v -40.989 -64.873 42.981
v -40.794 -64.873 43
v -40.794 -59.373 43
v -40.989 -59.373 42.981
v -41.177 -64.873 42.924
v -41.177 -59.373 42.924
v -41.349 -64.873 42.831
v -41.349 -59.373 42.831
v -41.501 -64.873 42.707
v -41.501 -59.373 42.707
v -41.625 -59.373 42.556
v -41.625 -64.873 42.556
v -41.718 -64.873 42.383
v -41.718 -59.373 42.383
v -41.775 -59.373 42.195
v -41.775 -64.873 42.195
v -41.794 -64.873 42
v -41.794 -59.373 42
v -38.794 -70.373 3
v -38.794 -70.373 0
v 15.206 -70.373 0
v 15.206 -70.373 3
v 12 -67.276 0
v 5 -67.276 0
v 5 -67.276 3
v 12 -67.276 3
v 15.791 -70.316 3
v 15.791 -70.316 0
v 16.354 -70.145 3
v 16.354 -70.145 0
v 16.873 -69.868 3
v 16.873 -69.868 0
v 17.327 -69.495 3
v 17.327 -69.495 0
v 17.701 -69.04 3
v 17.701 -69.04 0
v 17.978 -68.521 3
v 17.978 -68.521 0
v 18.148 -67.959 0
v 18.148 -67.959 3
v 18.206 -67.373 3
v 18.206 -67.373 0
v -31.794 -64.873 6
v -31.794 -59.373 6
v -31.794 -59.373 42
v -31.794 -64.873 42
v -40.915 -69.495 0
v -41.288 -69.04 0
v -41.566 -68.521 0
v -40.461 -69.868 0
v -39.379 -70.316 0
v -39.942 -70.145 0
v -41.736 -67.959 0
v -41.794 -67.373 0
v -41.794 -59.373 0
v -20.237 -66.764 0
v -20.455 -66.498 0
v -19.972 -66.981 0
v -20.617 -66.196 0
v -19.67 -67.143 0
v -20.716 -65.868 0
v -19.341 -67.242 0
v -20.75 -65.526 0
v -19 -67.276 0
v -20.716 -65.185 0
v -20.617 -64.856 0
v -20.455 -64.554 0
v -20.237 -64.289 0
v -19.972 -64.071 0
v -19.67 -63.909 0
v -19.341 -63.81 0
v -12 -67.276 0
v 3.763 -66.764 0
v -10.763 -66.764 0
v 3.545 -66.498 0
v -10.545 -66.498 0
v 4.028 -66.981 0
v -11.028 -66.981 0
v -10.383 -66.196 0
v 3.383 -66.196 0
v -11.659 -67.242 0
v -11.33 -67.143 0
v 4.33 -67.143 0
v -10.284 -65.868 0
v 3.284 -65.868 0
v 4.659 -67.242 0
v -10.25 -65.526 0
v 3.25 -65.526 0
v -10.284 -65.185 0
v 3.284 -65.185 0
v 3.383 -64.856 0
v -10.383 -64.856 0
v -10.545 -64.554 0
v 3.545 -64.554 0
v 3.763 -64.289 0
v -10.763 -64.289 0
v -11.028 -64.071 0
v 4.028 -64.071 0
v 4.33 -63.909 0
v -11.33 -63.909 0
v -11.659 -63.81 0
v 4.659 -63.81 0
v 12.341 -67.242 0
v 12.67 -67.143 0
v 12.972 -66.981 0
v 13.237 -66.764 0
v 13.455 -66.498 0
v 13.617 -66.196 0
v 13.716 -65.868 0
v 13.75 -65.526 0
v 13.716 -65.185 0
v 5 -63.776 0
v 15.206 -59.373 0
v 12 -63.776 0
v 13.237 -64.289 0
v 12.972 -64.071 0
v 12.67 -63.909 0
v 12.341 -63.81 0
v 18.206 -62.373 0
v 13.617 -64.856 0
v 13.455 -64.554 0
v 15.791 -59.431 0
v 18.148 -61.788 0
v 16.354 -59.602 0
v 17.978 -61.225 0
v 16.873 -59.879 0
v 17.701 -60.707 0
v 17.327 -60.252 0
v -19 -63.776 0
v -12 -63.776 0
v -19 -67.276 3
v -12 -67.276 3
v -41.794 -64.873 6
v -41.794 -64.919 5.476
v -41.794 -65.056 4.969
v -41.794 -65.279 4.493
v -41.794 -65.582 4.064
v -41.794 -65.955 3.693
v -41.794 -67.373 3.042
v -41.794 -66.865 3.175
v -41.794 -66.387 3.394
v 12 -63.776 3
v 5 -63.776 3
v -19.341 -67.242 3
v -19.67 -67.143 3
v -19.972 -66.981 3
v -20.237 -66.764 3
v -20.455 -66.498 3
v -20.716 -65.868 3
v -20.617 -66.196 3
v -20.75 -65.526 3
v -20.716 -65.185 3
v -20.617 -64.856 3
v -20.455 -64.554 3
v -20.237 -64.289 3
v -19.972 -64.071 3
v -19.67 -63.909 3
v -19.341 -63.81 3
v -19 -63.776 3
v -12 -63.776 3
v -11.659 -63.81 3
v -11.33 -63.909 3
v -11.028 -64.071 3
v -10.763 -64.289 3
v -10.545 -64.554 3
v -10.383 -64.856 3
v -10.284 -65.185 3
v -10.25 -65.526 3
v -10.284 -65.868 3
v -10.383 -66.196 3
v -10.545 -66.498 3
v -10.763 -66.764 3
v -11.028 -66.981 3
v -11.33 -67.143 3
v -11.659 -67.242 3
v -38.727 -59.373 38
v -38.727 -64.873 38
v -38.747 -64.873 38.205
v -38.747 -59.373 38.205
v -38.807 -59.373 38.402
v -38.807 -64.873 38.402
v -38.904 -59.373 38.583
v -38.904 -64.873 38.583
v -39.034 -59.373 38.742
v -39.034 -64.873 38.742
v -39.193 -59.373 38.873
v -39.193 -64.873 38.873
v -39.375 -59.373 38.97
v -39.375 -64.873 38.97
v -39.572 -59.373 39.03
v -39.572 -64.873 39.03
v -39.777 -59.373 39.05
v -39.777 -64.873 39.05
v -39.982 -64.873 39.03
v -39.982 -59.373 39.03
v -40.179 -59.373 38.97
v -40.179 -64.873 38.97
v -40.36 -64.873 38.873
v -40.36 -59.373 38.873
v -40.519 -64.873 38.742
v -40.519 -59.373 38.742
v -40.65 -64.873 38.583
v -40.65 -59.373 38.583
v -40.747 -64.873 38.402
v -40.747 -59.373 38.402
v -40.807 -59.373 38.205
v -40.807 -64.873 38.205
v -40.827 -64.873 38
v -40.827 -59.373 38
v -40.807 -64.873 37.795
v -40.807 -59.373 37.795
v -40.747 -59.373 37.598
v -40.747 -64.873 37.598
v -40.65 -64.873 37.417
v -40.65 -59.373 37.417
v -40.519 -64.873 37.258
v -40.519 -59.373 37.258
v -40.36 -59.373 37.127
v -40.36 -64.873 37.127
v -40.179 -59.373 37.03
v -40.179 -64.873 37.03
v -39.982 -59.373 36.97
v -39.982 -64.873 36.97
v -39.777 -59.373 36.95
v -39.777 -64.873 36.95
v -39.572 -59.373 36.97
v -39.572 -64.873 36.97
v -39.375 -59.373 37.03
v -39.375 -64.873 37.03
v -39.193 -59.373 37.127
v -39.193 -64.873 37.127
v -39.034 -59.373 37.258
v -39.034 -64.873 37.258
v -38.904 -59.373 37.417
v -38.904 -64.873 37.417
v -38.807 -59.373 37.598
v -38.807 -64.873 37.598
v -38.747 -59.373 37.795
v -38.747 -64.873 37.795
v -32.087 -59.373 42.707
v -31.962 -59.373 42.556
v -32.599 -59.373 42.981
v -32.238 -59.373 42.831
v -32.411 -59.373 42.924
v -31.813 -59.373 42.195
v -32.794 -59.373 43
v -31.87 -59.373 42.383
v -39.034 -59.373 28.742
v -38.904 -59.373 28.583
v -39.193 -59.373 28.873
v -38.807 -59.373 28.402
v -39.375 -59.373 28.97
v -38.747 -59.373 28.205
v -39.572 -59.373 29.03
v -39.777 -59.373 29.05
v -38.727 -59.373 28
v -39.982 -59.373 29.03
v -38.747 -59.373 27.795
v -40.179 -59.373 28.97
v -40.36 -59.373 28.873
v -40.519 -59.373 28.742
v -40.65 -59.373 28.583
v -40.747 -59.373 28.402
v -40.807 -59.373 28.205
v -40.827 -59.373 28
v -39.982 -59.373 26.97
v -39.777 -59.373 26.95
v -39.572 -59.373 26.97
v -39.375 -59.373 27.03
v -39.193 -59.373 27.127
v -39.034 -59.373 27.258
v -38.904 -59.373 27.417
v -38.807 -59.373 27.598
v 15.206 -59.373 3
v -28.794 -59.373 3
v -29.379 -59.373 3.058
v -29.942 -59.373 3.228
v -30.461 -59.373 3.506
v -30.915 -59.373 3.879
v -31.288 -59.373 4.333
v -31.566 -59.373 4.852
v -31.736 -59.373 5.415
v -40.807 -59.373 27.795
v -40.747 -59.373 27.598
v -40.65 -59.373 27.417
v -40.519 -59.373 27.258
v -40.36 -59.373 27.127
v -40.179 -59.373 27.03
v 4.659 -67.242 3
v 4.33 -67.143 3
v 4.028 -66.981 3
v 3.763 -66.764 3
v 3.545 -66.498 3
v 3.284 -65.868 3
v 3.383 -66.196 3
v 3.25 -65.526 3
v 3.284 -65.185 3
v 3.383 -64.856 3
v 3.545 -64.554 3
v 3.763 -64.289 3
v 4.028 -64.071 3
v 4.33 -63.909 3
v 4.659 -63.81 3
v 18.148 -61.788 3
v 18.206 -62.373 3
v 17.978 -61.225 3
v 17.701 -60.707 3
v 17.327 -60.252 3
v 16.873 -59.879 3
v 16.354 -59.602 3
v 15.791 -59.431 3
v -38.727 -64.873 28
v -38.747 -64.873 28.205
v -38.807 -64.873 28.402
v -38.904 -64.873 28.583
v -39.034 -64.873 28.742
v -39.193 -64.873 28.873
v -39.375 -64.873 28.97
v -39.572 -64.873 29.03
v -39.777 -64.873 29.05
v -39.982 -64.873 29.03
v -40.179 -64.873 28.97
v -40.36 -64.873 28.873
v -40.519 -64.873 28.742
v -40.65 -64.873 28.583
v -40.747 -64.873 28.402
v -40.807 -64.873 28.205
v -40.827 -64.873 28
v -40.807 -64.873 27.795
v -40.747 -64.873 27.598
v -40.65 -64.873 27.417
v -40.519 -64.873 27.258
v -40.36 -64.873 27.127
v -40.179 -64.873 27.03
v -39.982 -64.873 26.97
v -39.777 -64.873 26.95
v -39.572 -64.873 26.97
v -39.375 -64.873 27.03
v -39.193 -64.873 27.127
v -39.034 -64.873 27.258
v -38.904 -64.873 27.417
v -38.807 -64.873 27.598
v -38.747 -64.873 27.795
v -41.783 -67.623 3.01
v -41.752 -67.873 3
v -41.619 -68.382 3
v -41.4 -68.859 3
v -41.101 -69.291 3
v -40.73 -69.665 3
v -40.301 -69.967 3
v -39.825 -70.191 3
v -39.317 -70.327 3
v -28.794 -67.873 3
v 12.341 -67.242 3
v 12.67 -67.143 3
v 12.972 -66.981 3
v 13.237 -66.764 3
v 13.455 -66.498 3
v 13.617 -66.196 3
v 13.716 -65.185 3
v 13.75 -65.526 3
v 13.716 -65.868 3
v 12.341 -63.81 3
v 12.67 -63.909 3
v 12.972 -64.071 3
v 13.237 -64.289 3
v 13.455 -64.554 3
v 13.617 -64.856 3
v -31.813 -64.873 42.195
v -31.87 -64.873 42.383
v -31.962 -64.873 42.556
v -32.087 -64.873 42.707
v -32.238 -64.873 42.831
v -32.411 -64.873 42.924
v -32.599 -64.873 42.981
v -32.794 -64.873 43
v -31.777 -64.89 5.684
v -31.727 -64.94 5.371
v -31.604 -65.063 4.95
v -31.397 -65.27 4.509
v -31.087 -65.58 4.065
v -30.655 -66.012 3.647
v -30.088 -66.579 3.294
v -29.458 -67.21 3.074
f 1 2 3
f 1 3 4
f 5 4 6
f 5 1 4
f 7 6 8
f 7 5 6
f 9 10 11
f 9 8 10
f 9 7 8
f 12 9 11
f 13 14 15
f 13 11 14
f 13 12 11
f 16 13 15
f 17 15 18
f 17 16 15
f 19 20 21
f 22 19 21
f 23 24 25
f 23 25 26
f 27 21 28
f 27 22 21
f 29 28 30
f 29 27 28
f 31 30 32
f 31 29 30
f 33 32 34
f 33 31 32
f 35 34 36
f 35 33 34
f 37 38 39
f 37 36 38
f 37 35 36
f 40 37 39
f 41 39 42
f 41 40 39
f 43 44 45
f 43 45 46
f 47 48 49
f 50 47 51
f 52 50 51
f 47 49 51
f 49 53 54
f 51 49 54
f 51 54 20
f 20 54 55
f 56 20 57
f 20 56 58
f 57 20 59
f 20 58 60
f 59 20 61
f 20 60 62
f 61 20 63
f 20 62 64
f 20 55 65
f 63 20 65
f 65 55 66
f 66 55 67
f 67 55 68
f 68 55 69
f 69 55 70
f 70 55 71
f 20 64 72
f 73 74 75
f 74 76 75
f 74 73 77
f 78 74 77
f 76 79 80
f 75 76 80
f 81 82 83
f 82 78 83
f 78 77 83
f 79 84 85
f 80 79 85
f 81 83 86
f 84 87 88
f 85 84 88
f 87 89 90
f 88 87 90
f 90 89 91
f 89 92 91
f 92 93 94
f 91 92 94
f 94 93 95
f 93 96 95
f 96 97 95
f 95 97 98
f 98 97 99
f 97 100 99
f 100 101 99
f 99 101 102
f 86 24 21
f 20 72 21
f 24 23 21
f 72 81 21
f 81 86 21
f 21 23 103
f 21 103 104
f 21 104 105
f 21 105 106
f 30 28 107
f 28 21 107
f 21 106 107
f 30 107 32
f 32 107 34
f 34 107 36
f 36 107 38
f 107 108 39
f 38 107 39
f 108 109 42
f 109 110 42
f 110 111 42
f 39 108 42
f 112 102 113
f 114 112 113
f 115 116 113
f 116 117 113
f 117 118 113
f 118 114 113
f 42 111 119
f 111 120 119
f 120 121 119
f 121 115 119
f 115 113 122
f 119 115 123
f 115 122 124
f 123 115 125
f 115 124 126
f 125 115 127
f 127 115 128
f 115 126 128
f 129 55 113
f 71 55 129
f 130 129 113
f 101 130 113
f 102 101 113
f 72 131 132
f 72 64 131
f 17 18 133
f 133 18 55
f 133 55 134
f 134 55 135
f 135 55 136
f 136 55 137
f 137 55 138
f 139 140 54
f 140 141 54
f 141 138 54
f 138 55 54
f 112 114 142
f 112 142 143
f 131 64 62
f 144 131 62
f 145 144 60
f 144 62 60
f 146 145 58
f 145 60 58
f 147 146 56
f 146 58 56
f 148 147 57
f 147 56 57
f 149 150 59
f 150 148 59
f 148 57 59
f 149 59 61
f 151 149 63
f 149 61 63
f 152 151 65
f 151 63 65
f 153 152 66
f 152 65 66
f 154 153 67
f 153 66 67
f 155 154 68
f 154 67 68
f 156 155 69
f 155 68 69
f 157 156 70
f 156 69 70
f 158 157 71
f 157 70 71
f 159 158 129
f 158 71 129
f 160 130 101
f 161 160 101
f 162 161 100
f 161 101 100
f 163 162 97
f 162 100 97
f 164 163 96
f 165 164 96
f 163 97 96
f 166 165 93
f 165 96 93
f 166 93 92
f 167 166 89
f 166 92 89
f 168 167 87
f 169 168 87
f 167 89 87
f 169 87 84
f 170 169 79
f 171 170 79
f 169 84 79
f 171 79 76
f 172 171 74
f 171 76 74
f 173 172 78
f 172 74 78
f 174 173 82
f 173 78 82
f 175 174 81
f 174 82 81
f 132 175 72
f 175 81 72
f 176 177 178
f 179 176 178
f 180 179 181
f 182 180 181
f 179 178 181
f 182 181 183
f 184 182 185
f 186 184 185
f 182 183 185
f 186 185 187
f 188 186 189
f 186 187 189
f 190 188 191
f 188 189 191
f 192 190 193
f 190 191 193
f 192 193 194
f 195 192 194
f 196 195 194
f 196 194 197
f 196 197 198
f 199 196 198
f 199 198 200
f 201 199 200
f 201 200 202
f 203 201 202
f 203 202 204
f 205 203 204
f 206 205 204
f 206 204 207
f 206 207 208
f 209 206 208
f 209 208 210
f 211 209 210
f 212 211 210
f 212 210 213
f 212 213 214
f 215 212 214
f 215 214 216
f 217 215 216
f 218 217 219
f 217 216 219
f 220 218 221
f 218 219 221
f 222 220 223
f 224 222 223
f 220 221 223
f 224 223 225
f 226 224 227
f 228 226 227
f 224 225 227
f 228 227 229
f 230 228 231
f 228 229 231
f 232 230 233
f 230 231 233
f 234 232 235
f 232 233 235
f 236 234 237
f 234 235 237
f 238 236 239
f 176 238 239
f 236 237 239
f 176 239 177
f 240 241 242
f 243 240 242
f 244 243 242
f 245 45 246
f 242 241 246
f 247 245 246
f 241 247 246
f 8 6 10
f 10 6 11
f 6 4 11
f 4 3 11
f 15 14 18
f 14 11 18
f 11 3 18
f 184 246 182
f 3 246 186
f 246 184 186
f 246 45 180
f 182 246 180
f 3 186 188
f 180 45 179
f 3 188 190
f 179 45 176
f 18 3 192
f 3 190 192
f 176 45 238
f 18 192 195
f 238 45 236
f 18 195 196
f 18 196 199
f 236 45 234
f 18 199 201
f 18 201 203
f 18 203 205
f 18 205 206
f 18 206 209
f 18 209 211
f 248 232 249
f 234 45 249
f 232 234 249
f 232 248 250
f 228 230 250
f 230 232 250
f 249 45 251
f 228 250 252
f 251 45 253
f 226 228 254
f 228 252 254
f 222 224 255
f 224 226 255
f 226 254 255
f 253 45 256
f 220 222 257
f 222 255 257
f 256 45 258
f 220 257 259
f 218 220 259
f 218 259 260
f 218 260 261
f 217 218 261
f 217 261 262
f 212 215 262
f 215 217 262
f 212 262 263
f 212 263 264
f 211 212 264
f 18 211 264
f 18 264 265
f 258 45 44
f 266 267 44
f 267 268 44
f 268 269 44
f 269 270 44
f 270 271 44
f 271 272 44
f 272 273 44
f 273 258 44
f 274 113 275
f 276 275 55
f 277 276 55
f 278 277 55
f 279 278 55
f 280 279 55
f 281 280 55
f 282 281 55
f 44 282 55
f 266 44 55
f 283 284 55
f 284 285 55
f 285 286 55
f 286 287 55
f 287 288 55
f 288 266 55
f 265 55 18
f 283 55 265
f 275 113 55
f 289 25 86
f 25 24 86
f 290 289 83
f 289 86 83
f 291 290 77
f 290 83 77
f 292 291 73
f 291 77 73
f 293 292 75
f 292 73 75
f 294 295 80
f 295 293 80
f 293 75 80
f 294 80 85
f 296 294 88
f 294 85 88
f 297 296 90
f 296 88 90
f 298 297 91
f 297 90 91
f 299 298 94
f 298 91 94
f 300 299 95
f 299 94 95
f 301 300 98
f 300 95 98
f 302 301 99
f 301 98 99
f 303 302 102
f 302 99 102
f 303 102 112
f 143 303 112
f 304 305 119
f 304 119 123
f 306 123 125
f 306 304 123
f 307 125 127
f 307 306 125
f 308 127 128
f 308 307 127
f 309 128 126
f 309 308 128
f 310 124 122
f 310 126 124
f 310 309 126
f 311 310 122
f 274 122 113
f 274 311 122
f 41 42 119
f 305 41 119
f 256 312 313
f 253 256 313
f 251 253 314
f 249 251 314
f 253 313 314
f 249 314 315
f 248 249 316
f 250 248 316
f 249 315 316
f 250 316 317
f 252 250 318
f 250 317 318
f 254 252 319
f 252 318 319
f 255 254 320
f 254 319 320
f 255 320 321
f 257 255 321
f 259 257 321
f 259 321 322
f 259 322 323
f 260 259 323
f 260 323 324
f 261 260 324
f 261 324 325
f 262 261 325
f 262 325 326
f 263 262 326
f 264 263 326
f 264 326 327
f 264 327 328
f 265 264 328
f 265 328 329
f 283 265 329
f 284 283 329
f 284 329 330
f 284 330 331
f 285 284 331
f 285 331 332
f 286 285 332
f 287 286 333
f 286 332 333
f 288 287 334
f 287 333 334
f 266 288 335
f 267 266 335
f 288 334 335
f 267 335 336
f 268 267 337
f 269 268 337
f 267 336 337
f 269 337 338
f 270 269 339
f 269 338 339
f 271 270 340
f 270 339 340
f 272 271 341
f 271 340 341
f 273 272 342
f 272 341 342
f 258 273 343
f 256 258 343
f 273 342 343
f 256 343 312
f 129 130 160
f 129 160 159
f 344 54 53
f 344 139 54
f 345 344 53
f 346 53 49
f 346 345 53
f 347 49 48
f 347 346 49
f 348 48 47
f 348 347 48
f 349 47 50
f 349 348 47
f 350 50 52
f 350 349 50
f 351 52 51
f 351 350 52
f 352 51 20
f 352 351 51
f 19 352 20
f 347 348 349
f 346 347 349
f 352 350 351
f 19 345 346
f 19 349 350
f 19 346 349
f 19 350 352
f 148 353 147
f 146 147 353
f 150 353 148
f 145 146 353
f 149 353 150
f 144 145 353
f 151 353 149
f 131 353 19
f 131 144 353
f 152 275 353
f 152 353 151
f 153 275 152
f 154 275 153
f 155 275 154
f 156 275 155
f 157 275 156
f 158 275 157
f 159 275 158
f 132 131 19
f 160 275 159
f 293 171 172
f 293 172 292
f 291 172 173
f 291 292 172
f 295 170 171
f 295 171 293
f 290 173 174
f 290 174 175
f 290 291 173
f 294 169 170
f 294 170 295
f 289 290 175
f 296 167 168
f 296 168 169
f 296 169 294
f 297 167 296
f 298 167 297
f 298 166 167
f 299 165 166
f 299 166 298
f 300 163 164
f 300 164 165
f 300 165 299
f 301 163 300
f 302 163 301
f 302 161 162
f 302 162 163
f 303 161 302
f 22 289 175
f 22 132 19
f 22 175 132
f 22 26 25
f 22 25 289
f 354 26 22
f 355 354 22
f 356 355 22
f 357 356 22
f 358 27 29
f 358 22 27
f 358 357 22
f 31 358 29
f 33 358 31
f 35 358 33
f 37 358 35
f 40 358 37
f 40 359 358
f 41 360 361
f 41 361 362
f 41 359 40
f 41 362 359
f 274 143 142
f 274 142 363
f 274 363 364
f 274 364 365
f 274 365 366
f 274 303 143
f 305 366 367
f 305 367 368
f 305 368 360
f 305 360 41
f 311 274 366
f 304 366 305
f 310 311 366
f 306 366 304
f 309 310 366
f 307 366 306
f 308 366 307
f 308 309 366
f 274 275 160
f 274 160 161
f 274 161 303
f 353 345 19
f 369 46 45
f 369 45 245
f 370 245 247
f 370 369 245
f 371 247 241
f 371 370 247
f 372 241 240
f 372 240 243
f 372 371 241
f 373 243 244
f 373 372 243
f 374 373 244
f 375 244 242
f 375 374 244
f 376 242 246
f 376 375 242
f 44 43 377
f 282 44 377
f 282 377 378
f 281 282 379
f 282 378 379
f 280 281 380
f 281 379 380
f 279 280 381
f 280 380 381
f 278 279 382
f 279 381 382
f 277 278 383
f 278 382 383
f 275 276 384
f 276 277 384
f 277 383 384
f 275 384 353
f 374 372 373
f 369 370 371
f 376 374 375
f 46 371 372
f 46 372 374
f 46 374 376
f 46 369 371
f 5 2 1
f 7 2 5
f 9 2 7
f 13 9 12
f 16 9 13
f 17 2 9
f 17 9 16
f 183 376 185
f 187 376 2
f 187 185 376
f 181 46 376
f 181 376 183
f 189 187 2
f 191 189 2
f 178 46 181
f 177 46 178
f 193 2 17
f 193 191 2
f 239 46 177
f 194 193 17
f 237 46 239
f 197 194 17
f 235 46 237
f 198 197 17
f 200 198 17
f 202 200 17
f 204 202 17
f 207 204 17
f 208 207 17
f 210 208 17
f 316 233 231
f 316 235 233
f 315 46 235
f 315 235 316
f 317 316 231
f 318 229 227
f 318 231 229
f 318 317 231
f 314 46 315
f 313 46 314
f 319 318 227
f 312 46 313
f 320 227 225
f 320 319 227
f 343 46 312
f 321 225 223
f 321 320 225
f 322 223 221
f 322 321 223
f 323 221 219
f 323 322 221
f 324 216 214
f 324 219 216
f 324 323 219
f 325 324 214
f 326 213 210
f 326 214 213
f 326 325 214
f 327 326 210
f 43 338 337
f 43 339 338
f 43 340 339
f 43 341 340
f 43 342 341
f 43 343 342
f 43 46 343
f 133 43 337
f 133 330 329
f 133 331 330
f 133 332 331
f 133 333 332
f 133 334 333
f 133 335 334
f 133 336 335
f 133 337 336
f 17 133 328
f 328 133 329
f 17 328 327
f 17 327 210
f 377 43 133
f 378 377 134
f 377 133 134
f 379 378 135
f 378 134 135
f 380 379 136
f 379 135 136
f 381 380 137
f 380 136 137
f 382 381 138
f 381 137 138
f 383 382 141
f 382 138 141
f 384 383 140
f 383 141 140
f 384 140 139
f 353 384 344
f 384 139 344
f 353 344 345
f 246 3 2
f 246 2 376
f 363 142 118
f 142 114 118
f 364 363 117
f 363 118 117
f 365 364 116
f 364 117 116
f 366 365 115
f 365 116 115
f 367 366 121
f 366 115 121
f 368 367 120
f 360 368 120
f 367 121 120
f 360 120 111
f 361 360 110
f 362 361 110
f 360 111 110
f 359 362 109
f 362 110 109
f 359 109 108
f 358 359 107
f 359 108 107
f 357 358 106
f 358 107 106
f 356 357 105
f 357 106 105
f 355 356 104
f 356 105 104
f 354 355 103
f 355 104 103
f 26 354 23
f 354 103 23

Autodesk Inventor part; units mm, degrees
ref_plane "YZ Plane" through (0, 0, 0) normal (1, 0, 0) x (0, 1, 0)
ref_plane "XZ Plane" through (0, 0, 0) normal (0, 1, 0) x (-1, 0, 0)
ref_plane "XY Plane" through (0, 0, 0) normal (0, 0, 1) x (1, 0, 0)
ref_plane "Work Plane1" through (0, 0, 0) normal (0, 0, 1) x (1, 0, 0)
sketch "Sketch1" plane through (0, 0, 0) normal (0, 0, 1) x (1, 0, 0)
  line L0 (18.2061, -59.3733) -> (-41.7939, -59.3733)
  line L1 (-41.7939, -59.3733) -> (-41.7939, -70.3733)
  line L2 (-41.7939, -70.3733) -> (18.2061, -70.3733)
  line L3 (18.2061, -70.3733) -> (18.2061, -59.3733)
  circle A0 centre (12, -65.5261) radius 1.75 projected
  circle A1 centre (-12, -65.5261) radius 1.75 projected
  line L4 (-12, -67.2761) -> (-12, -63.7761)
  line L5 (-12, -63.7761) -> (-19, -63.7761)
  line L6 (-19, -63.7761) -> (-19, -67.2761)
  line L7 (-19, -67.2761) -> (-12, -67.2761)
  line L8 (-12, -67.2761) -> (-12, -63.7761)
  line L9 (12, -67.2761) -> (12, -63.7761)
  line L10 (12, -63.7761) -> (5, -63.7761)
  line L11 (5, -63.7761) -> (5, -67.2761)
  line L12 (5, -67.2761) -> (12, -67.2761)
  line L13 (12, -67.2761) -> (12, -63.7761)
  circle A2 centre (-19, -65.5261) radius 1.75
  circle A3 centre (5, -65.5261) radius 1.75
  point P0 (0, 0)
  dimension "d0" = 60
  dimension "d1" = 11
  dimension "d13" = 7
  dimension "d14" = 7
extrude "Extrusion1" add sketch "Sketch1" along normal blind 3
sketch "Sketch2" plane through (0, 0, 3) normal (0, 0, 1) x (1, 0, 0)
  line L0 (-41.7939, -59.3733) -> (-41.7939, -70.3733) projected
  line L1 (-41.7939, -59.3733) -> (-31.7939, -59.3733)
  line L2 (-31.7939, -59.3733) -> (-31.7939, -64.8733)
  line L3 (-31.7939, -64.8733) -> (-41.7939, -64.8733)
  line L4 (-41.7939, -64.8733) -> (-41.7939, -59.3733)
  point P0 (0, 0)
  dimension "d4" = 10
  dimension "d5" = 5.5
extrude "Extrusion2" add sketch "Sketch2" along normal blind 40
sketch "Sketch3" plane through (-41.7939, -64.8733, 3) normal (0, -1, 0) x (1, 0, 0)
  circle A0 centre (2.0172, 35) radius 1.05 projected
  circle A1 centre (2.0172, 25) radius 1.05 projected
  point P0 (41.7939, -3)
extrude "Extrusion3" cut sketch "Sketch3" against normal blind 5.5
fillet "Fillet1" radius 1 2 edges at (-41.7939, -62.1233, 43) (-31.7939, -62.1233, 43)
fillet "Fillet2" radius 3 2 edges at (-36.7939, -64.8733, 3) (-31.7939, -62.1233, 3)
fillet "Fillet3" radius 3 3 edges at (18.2061, -59.3733, 1.5) (18.2061, -70.3733, 1.5) (-41.7939, -70.3733, 1.5)
properties part number "Homing_switch_holder"
